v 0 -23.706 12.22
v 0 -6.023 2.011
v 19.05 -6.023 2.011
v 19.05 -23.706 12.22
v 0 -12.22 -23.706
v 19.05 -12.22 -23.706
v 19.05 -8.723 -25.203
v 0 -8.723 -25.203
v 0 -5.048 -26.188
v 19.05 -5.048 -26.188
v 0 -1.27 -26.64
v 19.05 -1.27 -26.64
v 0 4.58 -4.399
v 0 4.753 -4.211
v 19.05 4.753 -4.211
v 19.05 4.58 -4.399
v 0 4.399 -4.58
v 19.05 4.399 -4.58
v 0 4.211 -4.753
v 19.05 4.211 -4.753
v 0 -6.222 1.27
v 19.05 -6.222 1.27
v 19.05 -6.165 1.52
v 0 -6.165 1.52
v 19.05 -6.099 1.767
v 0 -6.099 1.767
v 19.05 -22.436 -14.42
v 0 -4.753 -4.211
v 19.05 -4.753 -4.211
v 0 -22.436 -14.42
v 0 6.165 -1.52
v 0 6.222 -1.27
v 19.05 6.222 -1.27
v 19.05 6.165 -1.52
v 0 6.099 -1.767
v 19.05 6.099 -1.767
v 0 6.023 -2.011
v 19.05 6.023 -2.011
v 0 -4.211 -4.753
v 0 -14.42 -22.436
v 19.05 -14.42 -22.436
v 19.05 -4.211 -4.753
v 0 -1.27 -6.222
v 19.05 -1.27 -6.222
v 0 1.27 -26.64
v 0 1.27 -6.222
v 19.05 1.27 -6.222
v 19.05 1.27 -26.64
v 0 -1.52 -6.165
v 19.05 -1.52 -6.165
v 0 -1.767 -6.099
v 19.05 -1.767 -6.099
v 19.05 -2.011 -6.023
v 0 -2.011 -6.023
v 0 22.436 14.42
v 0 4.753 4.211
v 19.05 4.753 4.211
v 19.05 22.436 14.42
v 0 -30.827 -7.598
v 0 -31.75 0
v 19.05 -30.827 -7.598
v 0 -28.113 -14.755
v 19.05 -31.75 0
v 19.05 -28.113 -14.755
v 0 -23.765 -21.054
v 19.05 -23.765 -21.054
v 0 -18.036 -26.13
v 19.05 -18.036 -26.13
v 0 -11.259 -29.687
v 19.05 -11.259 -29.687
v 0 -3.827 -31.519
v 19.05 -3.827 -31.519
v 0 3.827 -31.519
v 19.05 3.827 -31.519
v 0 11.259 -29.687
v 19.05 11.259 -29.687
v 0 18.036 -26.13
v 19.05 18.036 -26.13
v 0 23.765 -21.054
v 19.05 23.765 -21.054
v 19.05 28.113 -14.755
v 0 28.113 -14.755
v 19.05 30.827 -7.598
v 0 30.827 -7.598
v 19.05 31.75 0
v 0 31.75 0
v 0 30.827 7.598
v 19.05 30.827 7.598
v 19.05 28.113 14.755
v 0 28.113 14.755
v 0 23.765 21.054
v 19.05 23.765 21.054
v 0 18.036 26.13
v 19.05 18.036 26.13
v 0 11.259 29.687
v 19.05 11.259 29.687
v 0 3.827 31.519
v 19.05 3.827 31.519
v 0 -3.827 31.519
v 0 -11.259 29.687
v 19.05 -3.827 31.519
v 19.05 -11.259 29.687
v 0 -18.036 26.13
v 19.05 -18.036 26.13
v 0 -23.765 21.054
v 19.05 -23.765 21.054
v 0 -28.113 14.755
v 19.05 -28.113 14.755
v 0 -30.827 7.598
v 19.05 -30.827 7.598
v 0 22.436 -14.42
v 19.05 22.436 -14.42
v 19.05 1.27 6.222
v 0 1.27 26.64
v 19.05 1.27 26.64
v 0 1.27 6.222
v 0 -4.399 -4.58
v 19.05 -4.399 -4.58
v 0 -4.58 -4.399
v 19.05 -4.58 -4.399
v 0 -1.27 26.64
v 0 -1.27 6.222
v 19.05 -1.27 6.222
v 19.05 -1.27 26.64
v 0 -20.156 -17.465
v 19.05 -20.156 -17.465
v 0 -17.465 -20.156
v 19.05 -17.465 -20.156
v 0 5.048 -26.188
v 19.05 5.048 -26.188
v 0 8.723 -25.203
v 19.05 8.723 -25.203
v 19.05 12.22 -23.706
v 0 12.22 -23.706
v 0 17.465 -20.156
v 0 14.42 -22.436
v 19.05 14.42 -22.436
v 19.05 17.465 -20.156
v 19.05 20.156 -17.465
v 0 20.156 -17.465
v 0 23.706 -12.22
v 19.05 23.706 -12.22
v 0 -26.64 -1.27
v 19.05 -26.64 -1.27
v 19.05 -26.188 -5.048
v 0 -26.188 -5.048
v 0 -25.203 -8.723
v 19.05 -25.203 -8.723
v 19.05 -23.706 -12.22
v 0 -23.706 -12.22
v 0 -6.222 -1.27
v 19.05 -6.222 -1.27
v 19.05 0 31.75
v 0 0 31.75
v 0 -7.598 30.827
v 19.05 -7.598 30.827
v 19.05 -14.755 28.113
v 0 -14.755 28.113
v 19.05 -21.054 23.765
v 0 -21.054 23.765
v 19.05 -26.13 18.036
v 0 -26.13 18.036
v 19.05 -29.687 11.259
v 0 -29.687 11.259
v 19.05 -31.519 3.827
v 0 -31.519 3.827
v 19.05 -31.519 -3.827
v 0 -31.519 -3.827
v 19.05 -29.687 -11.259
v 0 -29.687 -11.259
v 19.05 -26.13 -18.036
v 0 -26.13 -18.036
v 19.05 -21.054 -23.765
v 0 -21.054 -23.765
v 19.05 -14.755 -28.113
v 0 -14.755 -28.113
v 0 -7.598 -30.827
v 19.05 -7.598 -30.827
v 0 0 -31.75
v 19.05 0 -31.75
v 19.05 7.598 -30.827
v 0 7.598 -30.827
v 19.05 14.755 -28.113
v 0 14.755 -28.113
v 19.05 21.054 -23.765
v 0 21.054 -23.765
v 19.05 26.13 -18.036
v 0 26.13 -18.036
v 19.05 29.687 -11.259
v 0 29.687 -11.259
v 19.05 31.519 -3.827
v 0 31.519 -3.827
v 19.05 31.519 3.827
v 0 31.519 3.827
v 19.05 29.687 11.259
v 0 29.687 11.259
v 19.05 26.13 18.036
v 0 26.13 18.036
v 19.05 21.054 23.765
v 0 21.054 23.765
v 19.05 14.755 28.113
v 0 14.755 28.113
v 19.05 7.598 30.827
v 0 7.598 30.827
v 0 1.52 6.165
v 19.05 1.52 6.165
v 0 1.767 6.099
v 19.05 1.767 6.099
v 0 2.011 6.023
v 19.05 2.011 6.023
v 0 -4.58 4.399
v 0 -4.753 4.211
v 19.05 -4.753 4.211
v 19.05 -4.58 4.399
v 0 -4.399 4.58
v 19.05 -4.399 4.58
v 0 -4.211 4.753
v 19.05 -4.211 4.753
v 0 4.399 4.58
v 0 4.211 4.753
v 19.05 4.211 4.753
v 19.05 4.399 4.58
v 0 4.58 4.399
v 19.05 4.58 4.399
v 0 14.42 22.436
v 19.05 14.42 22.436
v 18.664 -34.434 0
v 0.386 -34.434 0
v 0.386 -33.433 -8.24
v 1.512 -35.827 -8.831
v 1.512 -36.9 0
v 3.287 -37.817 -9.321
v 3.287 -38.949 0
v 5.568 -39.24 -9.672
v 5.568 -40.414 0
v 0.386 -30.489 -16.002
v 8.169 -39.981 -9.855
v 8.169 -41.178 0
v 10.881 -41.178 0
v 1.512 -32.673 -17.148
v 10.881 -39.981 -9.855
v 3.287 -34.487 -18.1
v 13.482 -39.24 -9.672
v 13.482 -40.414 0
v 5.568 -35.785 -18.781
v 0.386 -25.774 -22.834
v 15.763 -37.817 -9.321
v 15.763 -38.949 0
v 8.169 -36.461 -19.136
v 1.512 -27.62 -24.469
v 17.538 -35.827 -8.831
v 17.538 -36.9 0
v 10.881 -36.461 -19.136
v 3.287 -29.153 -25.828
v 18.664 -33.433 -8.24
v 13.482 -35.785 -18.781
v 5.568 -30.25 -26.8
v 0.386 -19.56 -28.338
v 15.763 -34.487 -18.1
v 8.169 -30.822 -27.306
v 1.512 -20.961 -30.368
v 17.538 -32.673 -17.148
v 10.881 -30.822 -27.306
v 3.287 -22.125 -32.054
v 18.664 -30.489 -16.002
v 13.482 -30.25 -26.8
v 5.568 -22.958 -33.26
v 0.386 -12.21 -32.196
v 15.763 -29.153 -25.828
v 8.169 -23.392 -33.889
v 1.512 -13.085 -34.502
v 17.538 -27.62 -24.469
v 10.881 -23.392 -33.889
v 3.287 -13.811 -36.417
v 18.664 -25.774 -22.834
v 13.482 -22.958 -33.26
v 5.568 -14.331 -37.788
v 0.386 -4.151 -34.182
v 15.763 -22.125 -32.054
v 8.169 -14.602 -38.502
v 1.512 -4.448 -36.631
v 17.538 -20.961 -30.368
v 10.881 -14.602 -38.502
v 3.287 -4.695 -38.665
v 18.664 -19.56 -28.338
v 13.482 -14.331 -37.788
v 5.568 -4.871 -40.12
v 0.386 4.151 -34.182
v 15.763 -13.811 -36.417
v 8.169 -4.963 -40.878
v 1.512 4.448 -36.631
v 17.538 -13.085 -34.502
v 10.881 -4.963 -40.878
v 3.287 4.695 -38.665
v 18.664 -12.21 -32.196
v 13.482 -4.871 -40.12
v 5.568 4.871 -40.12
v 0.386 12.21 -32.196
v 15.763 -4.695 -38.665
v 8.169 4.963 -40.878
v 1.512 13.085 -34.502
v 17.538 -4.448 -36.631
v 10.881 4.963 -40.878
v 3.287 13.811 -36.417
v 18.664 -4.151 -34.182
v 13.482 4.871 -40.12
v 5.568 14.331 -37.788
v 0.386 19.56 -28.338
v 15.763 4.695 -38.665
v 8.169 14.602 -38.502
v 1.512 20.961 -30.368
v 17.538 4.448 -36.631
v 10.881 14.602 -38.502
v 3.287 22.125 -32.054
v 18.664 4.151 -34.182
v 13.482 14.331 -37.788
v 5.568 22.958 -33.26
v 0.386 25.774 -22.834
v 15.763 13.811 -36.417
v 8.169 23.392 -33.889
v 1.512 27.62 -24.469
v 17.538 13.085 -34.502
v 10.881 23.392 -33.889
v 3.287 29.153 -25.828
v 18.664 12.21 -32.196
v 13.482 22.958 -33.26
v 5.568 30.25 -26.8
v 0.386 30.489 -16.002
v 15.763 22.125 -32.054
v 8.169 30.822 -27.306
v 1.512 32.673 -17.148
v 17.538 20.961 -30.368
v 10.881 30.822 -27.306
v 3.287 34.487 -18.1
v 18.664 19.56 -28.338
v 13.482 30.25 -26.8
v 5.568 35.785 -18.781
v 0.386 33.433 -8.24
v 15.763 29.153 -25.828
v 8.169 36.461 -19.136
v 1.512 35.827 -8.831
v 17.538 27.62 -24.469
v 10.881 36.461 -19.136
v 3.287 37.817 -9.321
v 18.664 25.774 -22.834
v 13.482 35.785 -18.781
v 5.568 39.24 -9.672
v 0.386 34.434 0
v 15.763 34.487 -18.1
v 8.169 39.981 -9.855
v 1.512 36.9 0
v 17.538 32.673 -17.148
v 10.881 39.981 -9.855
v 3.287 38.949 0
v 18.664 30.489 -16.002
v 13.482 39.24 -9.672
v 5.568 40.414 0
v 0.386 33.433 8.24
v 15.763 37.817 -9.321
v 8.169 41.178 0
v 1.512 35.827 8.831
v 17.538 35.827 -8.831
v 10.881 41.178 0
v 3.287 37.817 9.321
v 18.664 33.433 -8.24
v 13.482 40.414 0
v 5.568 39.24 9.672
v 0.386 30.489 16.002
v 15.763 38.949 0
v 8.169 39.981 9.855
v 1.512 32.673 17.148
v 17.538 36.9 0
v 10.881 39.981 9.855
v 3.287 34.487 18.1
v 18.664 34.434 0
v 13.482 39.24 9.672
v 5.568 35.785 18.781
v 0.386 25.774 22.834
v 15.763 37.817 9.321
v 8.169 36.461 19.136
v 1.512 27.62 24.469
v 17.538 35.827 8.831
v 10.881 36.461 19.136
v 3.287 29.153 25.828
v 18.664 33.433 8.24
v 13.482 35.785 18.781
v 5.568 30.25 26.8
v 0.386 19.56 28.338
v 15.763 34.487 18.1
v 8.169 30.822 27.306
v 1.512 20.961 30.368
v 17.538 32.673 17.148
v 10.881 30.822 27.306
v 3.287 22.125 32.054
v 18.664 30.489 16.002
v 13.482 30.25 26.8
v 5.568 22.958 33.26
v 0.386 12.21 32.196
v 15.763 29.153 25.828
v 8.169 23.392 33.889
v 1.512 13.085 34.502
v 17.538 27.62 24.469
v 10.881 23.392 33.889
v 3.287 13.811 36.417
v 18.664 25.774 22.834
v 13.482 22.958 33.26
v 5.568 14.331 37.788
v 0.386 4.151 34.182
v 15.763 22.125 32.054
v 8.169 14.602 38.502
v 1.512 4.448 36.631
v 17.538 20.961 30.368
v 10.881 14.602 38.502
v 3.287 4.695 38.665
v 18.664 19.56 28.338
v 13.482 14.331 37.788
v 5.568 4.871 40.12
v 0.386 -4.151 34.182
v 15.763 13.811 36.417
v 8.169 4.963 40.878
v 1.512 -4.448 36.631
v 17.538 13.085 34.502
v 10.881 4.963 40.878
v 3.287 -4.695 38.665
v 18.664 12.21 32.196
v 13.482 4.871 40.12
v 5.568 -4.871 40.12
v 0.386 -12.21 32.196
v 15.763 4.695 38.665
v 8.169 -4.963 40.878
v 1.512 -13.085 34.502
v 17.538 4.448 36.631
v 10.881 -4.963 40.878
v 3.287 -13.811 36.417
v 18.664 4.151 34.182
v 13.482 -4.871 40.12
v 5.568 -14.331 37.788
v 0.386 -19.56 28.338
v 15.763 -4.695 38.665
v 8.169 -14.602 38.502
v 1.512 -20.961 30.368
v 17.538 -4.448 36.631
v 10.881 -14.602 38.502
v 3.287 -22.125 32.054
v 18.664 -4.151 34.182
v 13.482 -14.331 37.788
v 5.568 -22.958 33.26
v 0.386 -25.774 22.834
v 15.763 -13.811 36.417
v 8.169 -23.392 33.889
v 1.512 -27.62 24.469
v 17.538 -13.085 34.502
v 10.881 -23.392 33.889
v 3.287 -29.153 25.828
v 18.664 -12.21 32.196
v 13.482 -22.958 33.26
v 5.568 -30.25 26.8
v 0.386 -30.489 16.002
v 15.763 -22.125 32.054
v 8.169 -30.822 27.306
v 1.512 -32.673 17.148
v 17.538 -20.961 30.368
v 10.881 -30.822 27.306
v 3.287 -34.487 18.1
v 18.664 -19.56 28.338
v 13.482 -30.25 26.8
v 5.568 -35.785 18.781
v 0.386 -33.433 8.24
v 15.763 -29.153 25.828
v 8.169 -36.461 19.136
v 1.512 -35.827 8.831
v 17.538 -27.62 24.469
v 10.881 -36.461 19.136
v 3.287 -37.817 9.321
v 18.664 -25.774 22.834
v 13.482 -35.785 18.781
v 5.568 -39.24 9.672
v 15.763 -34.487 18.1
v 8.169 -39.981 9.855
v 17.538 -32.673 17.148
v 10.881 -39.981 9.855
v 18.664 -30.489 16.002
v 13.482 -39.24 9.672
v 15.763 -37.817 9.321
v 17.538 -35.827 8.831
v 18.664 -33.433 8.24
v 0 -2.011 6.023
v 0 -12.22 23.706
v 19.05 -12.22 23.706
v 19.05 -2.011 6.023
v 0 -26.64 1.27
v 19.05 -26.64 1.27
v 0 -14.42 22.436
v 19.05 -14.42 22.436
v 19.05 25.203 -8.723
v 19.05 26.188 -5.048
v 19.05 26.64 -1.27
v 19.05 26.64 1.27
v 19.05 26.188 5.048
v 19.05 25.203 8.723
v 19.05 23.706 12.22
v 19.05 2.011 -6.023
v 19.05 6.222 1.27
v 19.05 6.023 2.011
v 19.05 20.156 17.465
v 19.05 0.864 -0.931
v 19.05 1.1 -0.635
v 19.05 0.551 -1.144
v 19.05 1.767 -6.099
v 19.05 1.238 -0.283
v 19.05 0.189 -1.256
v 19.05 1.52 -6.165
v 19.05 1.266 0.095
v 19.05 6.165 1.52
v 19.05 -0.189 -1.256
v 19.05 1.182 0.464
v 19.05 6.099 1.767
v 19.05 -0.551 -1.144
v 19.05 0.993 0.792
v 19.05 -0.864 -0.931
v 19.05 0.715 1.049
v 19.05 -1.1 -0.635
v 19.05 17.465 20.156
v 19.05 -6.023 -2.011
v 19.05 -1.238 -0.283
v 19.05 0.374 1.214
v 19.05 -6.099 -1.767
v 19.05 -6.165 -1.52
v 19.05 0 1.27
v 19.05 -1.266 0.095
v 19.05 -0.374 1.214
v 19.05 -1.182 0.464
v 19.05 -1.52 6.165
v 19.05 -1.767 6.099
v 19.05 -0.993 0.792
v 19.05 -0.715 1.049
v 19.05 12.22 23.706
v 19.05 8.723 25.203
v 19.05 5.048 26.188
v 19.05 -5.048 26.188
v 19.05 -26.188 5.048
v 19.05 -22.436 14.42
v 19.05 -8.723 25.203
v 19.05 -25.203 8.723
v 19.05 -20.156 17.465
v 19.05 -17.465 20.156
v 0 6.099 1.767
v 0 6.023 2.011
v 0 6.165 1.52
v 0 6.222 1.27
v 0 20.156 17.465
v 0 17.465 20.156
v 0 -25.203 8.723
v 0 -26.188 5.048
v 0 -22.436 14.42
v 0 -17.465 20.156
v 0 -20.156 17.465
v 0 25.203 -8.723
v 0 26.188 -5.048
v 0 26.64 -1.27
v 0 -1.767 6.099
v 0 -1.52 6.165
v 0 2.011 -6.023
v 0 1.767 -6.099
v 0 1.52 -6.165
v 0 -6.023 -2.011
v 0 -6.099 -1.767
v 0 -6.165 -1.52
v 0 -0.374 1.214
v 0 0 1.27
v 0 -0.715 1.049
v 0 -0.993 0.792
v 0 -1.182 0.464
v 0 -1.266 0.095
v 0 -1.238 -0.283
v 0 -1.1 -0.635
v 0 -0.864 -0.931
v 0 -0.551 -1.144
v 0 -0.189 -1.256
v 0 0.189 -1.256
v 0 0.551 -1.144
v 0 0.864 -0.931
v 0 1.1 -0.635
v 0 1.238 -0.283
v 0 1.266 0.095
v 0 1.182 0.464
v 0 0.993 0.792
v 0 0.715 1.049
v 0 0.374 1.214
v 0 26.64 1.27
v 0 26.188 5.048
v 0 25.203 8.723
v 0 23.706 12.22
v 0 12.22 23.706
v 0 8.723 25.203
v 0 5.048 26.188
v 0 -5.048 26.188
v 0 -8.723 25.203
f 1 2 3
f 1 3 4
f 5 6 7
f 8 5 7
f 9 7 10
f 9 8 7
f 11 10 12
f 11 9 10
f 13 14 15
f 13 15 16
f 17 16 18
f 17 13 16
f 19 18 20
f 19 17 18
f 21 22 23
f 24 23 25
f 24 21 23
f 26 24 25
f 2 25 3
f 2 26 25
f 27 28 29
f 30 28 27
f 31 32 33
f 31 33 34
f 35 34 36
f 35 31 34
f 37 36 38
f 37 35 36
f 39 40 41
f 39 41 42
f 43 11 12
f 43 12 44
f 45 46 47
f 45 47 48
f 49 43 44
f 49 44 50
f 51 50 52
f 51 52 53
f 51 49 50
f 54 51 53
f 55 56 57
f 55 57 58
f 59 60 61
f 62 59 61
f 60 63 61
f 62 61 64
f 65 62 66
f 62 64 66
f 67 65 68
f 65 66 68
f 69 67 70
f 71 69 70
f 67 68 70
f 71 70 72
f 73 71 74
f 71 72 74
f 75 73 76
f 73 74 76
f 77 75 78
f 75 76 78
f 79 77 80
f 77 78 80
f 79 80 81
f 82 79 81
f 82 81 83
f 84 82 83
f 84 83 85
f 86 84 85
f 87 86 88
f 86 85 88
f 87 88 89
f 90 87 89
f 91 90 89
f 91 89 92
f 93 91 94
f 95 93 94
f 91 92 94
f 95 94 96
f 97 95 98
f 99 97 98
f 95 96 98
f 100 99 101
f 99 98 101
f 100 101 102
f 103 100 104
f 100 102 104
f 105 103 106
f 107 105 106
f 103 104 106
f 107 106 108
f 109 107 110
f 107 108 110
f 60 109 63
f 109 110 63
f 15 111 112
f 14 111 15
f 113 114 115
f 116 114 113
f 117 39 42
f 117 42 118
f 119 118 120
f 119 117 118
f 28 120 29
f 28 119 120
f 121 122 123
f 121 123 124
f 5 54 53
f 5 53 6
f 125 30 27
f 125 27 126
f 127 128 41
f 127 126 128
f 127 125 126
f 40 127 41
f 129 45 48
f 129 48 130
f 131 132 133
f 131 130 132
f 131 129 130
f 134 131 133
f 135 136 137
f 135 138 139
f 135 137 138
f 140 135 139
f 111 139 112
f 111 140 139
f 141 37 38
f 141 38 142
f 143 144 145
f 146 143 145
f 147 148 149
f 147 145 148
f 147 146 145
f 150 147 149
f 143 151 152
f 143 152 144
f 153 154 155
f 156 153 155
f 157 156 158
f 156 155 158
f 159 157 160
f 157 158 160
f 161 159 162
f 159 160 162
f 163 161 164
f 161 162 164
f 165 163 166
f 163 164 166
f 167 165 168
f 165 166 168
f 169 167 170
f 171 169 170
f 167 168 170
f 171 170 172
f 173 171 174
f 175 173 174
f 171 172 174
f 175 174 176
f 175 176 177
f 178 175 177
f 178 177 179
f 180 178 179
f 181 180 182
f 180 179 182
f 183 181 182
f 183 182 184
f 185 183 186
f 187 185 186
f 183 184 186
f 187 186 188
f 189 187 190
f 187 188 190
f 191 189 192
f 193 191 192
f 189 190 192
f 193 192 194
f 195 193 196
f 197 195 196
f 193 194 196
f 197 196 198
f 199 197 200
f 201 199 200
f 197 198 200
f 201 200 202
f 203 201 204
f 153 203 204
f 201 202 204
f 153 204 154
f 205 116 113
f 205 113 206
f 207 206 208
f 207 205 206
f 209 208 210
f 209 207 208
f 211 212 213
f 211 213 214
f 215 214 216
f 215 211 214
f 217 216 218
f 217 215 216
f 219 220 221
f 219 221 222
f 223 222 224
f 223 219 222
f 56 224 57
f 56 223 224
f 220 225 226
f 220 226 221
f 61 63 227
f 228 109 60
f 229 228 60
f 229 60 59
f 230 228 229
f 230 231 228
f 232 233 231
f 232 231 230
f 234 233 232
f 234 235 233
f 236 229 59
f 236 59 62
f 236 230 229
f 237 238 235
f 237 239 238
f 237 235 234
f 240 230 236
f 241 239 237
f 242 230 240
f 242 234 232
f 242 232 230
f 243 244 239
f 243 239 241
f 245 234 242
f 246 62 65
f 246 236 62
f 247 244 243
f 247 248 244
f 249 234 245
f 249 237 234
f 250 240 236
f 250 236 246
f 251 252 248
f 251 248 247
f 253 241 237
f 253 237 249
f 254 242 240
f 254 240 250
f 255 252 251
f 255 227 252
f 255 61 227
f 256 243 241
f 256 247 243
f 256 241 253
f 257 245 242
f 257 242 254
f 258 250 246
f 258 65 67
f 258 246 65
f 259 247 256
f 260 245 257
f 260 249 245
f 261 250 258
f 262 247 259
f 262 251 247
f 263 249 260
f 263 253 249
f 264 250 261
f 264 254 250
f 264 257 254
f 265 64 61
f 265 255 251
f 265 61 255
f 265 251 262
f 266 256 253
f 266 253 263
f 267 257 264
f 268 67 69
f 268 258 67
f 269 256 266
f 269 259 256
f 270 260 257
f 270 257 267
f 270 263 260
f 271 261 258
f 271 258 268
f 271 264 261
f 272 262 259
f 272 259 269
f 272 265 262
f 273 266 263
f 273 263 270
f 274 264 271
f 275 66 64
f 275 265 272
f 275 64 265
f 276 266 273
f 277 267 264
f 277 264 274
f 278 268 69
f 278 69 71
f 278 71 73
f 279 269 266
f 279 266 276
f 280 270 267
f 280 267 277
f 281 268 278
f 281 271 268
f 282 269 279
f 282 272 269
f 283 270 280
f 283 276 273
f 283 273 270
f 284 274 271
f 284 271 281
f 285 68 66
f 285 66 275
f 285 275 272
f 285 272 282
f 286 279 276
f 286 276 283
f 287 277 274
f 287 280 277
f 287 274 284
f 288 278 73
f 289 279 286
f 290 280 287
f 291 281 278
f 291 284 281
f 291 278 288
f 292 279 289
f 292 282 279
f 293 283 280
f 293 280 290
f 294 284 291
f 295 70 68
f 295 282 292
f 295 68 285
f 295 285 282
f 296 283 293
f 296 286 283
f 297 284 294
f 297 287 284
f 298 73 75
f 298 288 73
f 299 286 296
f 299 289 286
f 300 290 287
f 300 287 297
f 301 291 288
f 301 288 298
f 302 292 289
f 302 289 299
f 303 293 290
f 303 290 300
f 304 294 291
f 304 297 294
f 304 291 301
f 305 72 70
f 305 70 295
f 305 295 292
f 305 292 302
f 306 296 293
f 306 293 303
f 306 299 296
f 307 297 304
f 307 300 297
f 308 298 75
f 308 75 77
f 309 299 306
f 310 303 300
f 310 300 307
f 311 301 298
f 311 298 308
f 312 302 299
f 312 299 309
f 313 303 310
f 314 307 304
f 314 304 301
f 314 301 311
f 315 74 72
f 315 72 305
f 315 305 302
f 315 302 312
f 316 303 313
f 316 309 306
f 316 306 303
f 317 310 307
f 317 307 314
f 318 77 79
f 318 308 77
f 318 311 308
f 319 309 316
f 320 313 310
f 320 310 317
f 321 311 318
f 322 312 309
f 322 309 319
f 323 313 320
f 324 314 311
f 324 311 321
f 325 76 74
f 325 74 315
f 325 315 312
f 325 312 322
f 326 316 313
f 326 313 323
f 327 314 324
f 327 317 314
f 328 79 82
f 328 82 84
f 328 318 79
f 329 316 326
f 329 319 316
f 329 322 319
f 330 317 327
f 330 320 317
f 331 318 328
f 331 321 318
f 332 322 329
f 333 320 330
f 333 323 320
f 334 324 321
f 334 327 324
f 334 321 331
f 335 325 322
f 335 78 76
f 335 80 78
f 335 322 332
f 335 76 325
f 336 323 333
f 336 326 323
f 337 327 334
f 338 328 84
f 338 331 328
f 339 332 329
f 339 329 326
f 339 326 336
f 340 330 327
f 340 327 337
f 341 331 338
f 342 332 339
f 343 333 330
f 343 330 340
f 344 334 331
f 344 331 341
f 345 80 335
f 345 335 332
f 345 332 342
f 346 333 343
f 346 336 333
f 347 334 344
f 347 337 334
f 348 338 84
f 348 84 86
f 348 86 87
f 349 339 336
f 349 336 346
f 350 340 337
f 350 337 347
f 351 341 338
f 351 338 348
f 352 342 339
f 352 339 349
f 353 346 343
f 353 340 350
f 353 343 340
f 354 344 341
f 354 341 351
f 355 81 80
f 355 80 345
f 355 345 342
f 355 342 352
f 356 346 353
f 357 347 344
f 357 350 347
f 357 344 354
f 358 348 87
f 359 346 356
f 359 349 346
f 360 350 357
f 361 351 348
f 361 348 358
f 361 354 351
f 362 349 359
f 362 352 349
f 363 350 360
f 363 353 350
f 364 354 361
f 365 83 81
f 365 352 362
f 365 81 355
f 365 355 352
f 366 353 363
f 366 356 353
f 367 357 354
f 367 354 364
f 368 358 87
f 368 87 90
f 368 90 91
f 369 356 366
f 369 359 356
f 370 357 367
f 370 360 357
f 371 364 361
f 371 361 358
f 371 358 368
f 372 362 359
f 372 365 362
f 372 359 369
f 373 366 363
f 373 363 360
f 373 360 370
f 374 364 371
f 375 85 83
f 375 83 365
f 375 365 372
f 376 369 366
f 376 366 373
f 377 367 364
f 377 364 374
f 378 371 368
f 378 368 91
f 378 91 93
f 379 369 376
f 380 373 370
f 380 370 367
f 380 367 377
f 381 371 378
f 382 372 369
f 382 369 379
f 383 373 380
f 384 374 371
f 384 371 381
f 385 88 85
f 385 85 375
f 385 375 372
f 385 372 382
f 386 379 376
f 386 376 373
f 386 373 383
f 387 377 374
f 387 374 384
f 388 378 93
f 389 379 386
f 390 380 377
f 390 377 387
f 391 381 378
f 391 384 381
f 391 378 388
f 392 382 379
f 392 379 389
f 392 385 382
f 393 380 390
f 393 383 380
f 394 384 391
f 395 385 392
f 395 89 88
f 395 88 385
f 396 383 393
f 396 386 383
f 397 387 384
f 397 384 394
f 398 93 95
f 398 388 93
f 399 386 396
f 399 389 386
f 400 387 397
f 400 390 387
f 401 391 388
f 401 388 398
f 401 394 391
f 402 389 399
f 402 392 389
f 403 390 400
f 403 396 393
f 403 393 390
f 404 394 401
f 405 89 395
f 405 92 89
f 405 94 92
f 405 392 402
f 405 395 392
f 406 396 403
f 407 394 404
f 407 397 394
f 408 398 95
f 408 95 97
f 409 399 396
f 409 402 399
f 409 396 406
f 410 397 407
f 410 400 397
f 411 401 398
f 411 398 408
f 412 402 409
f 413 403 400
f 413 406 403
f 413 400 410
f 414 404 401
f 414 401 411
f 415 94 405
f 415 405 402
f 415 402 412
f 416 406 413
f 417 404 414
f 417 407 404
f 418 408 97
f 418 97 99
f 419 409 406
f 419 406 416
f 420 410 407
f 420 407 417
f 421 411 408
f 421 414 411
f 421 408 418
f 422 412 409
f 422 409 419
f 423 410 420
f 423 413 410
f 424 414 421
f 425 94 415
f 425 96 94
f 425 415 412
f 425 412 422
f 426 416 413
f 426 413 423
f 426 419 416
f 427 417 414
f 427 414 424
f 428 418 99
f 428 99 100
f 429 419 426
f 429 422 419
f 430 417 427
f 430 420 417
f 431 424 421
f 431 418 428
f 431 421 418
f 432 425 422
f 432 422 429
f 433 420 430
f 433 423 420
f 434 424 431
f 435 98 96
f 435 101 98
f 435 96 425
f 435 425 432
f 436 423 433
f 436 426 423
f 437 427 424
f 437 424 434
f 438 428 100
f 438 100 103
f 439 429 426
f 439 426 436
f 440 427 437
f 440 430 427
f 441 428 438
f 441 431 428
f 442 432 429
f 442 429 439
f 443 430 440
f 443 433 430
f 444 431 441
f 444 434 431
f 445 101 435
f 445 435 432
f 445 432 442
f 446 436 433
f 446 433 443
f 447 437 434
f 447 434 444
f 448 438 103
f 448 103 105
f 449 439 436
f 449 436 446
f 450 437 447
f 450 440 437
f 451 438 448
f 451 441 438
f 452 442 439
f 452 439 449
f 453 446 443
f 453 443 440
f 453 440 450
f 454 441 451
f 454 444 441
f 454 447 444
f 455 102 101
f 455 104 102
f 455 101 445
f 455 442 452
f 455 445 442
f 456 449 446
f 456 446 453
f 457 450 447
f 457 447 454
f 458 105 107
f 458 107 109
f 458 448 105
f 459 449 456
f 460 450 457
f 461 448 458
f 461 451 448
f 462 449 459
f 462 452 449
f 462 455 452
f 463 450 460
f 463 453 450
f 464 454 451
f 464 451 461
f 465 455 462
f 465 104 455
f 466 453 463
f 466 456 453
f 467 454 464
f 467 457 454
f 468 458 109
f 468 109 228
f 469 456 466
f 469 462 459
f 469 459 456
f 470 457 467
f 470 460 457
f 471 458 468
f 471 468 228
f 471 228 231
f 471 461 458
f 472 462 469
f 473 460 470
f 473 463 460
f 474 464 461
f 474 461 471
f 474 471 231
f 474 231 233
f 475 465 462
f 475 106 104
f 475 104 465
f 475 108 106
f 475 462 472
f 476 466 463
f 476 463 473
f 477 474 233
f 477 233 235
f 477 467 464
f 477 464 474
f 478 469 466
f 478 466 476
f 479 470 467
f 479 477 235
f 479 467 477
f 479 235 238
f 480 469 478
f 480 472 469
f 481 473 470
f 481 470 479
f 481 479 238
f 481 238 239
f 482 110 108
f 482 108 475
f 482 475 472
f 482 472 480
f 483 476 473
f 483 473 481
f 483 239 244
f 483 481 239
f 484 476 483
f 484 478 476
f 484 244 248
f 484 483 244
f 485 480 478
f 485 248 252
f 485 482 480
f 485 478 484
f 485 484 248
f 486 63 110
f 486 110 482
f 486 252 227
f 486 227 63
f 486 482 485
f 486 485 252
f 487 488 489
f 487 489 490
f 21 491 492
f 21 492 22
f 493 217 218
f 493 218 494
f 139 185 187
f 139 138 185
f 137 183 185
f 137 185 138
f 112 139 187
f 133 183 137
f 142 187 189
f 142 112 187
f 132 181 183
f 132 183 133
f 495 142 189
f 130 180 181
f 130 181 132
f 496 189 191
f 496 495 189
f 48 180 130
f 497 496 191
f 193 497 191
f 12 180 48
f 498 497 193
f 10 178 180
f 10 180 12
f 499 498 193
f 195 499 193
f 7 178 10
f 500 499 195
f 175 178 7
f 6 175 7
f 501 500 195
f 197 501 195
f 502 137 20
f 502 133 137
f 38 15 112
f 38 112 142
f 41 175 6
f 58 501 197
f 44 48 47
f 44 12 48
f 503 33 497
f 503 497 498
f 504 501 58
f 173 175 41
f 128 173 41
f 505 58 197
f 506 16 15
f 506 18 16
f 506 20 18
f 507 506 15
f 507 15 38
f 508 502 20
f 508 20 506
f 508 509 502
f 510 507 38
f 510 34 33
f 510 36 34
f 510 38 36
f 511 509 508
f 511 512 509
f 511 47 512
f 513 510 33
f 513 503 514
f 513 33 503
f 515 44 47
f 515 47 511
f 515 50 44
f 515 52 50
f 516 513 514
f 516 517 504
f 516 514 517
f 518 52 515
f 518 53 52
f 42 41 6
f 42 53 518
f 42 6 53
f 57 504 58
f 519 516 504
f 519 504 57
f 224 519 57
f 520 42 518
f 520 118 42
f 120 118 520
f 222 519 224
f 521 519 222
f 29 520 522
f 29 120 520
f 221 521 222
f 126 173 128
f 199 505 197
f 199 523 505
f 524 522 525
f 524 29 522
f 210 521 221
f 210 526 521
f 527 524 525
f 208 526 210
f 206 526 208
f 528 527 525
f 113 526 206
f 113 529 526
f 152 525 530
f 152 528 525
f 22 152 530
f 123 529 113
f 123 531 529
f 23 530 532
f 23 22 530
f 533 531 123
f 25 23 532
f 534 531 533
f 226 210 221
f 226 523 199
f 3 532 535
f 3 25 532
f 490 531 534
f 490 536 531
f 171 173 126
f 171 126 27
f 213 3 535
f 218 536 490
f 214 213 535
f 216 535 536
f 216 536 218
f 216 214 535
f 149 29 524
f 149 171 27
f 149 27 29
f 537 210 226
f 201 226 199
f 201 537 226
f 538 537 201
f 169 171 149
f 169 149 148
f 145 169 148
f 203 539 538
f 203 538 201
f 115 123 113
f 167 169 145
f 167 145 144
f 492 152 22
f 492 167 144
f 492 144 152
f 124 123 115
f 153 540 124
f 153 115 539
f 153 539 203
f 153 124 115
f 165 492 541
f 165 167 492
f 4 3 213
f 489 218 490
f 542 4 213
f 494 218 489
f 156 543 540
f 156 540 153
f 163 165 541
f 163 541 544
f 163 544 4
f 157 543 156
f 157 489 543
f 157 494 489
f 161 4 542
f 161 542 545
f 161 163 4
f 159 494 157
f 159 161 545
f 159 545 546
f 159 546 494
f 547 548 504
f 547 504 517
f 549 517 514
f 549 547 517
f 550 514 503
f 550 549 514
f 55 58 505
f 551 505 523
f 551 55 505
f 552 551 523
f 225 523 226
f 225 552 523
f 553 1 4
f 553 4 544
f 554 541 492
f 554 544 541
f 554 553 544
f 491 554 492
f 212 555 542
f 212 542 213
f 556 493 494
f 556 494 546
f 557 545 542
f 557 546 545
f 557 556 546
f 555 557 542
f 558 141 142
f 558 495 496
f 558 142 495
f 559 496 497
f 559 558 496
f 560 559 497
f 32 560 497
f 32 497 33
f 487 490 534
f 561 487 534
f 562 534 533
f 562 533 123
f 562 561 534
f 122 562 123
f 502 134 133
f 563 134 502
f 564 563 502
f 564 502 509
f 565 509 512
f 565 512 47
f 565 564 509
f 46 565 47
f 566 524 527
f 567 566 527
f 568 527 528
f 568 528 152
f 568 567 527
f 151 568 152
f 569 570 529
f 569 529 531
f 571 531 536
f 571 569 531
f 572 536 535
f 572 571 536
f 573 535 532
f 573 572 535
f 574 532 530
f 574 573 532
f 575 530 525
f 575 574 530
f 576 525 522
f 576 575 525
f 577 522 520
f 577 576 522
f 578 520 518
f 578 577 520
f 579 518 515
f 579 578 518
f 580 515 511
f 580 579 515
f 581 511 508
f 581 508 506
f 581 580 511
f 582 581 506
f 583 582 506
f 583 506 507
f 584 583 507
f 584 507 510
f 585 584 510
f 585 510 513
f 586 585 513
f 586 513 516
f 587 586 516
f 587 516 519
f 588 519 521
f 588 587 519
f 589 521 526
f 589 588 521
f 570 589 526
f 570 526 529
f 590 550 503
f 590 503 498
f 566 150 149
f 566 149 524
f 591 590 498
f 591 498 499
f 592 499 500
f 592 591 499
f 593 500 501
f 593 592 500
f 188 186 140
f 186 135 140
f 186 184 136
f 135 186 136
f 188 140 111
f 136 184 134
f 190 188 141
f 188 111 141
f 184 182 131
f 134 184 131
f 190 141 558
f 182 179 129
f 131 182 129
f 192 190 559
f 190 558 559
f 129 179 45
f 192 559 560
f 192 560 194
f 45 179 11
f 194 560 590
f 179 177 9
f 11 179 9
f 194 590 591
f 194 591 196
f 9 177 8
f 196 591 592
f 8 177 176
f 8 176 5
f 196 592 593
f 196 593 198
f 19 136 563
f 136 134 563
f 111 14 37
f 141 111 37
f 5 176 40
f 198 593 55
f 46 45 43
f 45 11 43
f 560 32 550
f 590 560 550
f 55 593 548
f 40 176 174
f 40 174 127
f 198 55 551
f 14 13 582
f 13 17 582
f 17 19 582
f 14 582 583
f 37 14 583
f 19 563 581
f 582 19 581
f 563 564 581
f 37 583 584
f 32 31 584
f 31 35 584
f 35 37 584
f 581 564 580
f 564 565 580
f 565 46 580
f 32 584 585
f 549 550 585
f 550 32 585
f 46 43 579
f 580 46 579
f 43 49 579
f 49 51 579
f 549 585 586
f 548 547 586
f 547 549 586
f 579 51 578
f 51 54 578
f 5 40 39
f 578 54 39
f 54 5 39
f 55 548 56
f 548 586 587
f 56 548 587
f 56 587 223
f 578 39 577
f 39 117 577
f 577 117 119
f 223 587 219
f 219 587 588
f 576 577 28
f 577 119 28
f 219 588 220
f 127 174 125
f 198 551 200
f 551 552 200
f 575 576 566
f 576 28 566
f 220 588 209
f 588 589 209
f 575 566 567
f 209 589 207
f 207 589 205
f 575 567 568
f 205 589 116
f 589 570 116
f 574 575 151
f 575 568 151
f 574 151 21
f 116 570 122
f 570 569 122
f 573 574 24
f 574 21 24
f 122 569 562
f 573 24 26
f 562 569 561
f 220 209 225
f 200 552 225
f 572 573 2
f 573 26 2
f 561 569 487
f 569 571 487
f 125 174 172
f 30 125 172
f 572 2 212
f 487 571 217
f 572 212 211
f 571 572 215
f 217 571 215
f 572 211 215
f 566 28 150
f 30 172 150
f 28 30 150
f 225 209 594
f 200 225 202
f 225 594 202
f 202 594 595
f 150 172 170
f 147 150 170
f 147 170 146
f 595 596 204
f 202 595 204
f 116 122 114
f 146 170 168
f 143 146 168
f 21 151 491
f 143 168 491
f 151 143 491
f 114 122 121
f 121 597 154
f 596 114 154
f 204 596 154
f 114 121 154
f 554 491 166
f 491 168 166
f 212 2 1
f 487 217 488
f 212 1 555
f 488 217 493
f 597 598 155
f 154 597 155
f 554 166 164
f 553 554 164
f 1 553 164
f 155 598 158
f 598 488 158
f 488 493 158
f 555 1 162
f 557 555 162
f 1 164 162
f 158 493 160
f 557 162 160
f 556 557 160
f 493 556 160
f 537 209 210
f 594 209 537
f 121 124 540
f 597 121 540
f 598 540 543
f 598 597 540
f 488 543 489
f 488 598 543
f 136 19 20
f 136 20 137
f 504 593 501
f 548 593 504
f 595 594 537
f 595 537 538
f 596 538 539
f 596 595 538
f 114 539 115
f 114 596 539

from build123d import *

# Parameters (mm, degrees)
SKETCH1_R               = 31.75
SKETCH1_R_2             = 1.27
BOSS_EXTRUDE1_DEPTH     = 19.05
CUT_EXTRUDE1_DEPTH      = 49.77527549896566
CUT_EXTRUDE1_DEPTH_BACK = 49.77527549896566


with BuildPart() as part:
    # Sketch1 → Boss-Extrude1 (new body)
    with BuildSketch(Plane(origin=(0, 0, 0), x_dir=(0, 0, -1), z_dir=(1, 0, 0))):
        with Locations(Location((0, 0, 0), (0, 0, 180))):
            Circle(SKETCH1_R)
        with Locations(Location((0, 0, 0), (0, 0, 180))):
            Circle(SKETCH1_R_2, mode=Mode.SUBTRACT)
    extrude(amount=BOSS_EXTRUDE1_DEPTH)

    # Sketch2 → Cut-Extrude1 (cut, two sides: drawn at the far end of the back side and taken through both)
    with BuildSketch(Plane(origin=(19.05, 0, 0), x_dir=(0, 0, -1), z_dir=(1, 0, 0)).offset(-CUT_EXTRUDE1_DEPTH_BACK)):
        with BuildLine():
            Line((-1.270000000000003, 6.221703946669272), (-1.27, 26.63974474352185))
            ThreePointArc((-1.27, 26.63974474352185), (-6.902703932884231, 25.76124178712945), (-12.2200201089547, 23.70569569822288))
            Line((-12.2200201089547, 23.70569569822288), (-2.0109997105283997, 6.023153672641492))
            ThreePointArc((-2.0109997105283997, 6.023153672641492), (-1.6435009364010087, 6.133628996935583), (-1.270000000000003, 6.221703946669272))
        make_face()
        with BuildLine():
            Line((1.27, 26.63974474352185), (1.270000000000003, 6.221703946669272))
            ThreePointArc((1.270000000000003, 6.221703946669272), (1.643500936401007, 6.133628996935585), (2.010999710528396, 6.023153672641493))
            Line((2.010999710528396, 6.023153672641493), (12.220020108954685, 23.70569569822289))
            ThreePointArc((12.220020108954685, 23.70569569822289), (6.902703932884228, 25.761241787129453), (1.27, 26.63974474352185))
        make_face()
        with BuildLine():
            Line((14.41972463456716, 22.435695698222887), (4.2107042361408755, 4.753153672641491))
            ThreePointArc((4.2107042361408755, 4.753153672641491), (4.490128060534575, 4.490128060534578), (4.753153672641489, 4.210704236140876))
            Line((4.753153672641489, 4.210704236140876), (22.435695698222883, 14.419724634567164))
            ThreePointArc((22.435695698222883, 14.419724634567164), (18.858537854245217, 18.858537854245224), (14.41972463456716, 22.435695698222887))
        make_face()
        with BuildLine():
            Line((23.705695698222886, 12.22002010895469), (6.023153672641493, 2.0109997105283974))
            ThreePointArc((6.023153672641493, 2.0109997105283974), (6.133628996935583, 1.6435009364010076), (6.221703946669272, 1.2700000000000038))
            Line((6.221703946669272, 1.2700000000000038), (26.63974474352185, 1.270000000000002))
            ThreePointArc((26.63974474352185, 1.270000000000002), (25.76124178712945, 6.902703932884231), (23.705695698222886, 12.22002010895469))
        make_face()
        with BuildLine():
            Line((26.63974474352185, -1.2699999999999985), (6.221703946669272, -1.270000000000002))
            ThreePointArc((6.221703946669272, -1.270000000000002), (6.133628996935585, -1.6435009364010065), (6.023153672641493, -2.010999710528396))
            Line((6.023153672641493, -2.010999710528396), (23.705695698222893, -12.220020108954682))
            ThreePointArc((23.705695698222893, -12.220020108954682), (25.761241787129453, -6.902703932884224), (26.63974474352185, -1.2699999999999985))
        make_face()
        with BuildLine():
            Line((22.43569569822289, -14.419724634567157), (4.753153672641491, -4.2107042361408755))
            ThreePointArc((4.753153672641491, -4.2107042361408755), (4.490128060534579, -4.490128060534576), (4.210704236140877, -4.753153672641489))
            Line((4.210704236140877, -4.753153672641489), (14.419724634567169, -22.43569569822288))
            ThreePointArc((14.419724634567169, -22.43569569822288), (18.858537854245224, -18.858537854245217), (22.43569569822289, -14.419724634567157))
        make_face()
        with BuildLine():
            Line((12.220020108954696, -23.705695698222883), (2.0109997105283988, -6.0231536726414925))
            ThreePointArc((2.0109997105283988, -6.0231536726414925), (1.6435009364010082, -6.133628996935584), (1.2700000000000038, -6.2217039466692725))
            Line((1.2700000000000038, -6.2217039466692725), (1.2700000000000036, -26.63974474352185))
            ThreePointArc((1.2700000000000036, -26.63974474352185), (6.902703932884234, -25.761241787129446), (12.220020108954696, -23.705695698222883))
        make_face()
        with BuildLine():
            Line((-1.2699999999999971, -26.63974474352185), (-1.270000000000002, -6.2217039466692725))
            ThreePointArc((-1.270000000000002, -6.2217039466692725), (-1.6435009364010047, -6.133628996935585), (-2.0109997105283943, -6.023153672641494))
            Line((-2.0109997105283943, -6.023153672641494), (-12.22002010895468, -23.705695698222893))
            ThreePointArc((-12.22002010895468, -23.705695698222893), (-6.9027039328842195, -25.761241787129457), (-1.2699999999999971, -26.63974474352185))
        make_face()
        with BuildLine():
            Line((-14.419724634567155, -22.43569569822289), (-4.210704236140875, -4.75315367264149))
            ThreePointArc((-4.210704236140875, -4.75315367264149), (-4.490128060534576, -4.490128060534577), (-4.753153672641489, -4.210704236140876))
            Line((-4.753153672641489, -4.210704236140876), (-22.43569569822288, -14.419724634567173))
            ThreePointArc((-22.43569569822288, -14.419724634567173), (-18.858537854245213, -18.858537854245235), (-14.419724634567155, -22.43569569822289))
        make_face()
        with BuildLine():
            Line((-23.705695698222883, -12.2200201089547), (-6.0231536726414925, -2.0109997105283997))
            ThreePointArc((-6.0231536726414925, -2.0109997105283997), (-6.133628996935583, -1.6435009364010085), (-6.221703946669272, -1.2700000000000038))
            Line((-6.221703946669272, -1.2700000000000038), (-26.63974474352185, -1.2700000000000056))
            ThreePointArc((-26.63974474352185, -1.2700000000000056), (-25.761241787129443, -6.902703932884247), (-23.705695698222883, -12.2200201089547))
        make_face()
        with BuildLine():
            Line((-26.63974474352185, 1.2699999999999951), (-6.221703946669272, 1.270000000000002))
            ThreePointArc((-6.221703946669272, 1.270000000000002), (-6.133628996935584, 1.6435009364010056), (-6.023153672641494, 2.0109997105283917))
            Line((-6.023153672641494, 2.0109997105283917), (-23.705695698222897, 12.22002010895467))
            ThreePointArc((-23.705695698222897, 12.22002010895467), (-25.761241787129453, 6.902703932884224), (-26.63974474352185, 1.2699999999999951))
        make_face()
        with BuildLine():
            Line((-22.435695698222894, 14.419724634567144), (-4.753153672641494, 4.210704236140872))
            ThreePointArc((-4.753153672641494, 4.210704236140872), (-4.49012806053458, 4.490128060534572), (-4.210704236140877, 4.7531536726414885))
            Line((-4.210704236140877, 4.7531536726414885), (-14.419724634567173, 22.435695698222876))
            ThreePointArc((-14.419724634567173, 22.435695698222876), (-18.858537854245238, 18.858537854245206), (-22.435695698222894, 14.419724634567144))
        make_face()
    extrude(amount=CUT_EXTRUDE1_DEPTH + CUT_EXTRUDE1_DEPTH_BACK, mode=Mode.SUBTRACT)


with BuildPart() as body_2:
    # Sweep1: sweep along a curve in space
    with BuildLine() as sweep1_path:
        ThreePointArc((19.05, 0, -31.75), (19.05, 22.45064030267288, -22.450640302672884), (19.05, 31.75, 0))
        ThreePointArc((19.05, 31.75, 0), (19.05, 22.450640302672884, 22.45064030267288), (19.05, 0, 31.75))
        ThreePointArc((19.05, 0, 31.75), (19.05, -22.45064030267288, 22.450640302672884), (19.05, -31.75, 0))
        ThreePointArc((19.05, -31.75, 0), (19.05, -22.450640302672884, -22.45064030267288), (19.05, 0, -31.75))
    # Sketch3 → Sweep1 (sweep)
    with BuildSketch(Plane.XY):
        with BuildLine():
            Line((19.05, 31.75), (1.388e-14, 31.75))
            ThreePointArc((1.388e-14, 31.75), (9.525000000000007, 41.27499999999999), (19.05, 31.75))
        make_face()
    sweep(path=sweep1_path.line)


solid = Compound([part.part, body_2.part])
